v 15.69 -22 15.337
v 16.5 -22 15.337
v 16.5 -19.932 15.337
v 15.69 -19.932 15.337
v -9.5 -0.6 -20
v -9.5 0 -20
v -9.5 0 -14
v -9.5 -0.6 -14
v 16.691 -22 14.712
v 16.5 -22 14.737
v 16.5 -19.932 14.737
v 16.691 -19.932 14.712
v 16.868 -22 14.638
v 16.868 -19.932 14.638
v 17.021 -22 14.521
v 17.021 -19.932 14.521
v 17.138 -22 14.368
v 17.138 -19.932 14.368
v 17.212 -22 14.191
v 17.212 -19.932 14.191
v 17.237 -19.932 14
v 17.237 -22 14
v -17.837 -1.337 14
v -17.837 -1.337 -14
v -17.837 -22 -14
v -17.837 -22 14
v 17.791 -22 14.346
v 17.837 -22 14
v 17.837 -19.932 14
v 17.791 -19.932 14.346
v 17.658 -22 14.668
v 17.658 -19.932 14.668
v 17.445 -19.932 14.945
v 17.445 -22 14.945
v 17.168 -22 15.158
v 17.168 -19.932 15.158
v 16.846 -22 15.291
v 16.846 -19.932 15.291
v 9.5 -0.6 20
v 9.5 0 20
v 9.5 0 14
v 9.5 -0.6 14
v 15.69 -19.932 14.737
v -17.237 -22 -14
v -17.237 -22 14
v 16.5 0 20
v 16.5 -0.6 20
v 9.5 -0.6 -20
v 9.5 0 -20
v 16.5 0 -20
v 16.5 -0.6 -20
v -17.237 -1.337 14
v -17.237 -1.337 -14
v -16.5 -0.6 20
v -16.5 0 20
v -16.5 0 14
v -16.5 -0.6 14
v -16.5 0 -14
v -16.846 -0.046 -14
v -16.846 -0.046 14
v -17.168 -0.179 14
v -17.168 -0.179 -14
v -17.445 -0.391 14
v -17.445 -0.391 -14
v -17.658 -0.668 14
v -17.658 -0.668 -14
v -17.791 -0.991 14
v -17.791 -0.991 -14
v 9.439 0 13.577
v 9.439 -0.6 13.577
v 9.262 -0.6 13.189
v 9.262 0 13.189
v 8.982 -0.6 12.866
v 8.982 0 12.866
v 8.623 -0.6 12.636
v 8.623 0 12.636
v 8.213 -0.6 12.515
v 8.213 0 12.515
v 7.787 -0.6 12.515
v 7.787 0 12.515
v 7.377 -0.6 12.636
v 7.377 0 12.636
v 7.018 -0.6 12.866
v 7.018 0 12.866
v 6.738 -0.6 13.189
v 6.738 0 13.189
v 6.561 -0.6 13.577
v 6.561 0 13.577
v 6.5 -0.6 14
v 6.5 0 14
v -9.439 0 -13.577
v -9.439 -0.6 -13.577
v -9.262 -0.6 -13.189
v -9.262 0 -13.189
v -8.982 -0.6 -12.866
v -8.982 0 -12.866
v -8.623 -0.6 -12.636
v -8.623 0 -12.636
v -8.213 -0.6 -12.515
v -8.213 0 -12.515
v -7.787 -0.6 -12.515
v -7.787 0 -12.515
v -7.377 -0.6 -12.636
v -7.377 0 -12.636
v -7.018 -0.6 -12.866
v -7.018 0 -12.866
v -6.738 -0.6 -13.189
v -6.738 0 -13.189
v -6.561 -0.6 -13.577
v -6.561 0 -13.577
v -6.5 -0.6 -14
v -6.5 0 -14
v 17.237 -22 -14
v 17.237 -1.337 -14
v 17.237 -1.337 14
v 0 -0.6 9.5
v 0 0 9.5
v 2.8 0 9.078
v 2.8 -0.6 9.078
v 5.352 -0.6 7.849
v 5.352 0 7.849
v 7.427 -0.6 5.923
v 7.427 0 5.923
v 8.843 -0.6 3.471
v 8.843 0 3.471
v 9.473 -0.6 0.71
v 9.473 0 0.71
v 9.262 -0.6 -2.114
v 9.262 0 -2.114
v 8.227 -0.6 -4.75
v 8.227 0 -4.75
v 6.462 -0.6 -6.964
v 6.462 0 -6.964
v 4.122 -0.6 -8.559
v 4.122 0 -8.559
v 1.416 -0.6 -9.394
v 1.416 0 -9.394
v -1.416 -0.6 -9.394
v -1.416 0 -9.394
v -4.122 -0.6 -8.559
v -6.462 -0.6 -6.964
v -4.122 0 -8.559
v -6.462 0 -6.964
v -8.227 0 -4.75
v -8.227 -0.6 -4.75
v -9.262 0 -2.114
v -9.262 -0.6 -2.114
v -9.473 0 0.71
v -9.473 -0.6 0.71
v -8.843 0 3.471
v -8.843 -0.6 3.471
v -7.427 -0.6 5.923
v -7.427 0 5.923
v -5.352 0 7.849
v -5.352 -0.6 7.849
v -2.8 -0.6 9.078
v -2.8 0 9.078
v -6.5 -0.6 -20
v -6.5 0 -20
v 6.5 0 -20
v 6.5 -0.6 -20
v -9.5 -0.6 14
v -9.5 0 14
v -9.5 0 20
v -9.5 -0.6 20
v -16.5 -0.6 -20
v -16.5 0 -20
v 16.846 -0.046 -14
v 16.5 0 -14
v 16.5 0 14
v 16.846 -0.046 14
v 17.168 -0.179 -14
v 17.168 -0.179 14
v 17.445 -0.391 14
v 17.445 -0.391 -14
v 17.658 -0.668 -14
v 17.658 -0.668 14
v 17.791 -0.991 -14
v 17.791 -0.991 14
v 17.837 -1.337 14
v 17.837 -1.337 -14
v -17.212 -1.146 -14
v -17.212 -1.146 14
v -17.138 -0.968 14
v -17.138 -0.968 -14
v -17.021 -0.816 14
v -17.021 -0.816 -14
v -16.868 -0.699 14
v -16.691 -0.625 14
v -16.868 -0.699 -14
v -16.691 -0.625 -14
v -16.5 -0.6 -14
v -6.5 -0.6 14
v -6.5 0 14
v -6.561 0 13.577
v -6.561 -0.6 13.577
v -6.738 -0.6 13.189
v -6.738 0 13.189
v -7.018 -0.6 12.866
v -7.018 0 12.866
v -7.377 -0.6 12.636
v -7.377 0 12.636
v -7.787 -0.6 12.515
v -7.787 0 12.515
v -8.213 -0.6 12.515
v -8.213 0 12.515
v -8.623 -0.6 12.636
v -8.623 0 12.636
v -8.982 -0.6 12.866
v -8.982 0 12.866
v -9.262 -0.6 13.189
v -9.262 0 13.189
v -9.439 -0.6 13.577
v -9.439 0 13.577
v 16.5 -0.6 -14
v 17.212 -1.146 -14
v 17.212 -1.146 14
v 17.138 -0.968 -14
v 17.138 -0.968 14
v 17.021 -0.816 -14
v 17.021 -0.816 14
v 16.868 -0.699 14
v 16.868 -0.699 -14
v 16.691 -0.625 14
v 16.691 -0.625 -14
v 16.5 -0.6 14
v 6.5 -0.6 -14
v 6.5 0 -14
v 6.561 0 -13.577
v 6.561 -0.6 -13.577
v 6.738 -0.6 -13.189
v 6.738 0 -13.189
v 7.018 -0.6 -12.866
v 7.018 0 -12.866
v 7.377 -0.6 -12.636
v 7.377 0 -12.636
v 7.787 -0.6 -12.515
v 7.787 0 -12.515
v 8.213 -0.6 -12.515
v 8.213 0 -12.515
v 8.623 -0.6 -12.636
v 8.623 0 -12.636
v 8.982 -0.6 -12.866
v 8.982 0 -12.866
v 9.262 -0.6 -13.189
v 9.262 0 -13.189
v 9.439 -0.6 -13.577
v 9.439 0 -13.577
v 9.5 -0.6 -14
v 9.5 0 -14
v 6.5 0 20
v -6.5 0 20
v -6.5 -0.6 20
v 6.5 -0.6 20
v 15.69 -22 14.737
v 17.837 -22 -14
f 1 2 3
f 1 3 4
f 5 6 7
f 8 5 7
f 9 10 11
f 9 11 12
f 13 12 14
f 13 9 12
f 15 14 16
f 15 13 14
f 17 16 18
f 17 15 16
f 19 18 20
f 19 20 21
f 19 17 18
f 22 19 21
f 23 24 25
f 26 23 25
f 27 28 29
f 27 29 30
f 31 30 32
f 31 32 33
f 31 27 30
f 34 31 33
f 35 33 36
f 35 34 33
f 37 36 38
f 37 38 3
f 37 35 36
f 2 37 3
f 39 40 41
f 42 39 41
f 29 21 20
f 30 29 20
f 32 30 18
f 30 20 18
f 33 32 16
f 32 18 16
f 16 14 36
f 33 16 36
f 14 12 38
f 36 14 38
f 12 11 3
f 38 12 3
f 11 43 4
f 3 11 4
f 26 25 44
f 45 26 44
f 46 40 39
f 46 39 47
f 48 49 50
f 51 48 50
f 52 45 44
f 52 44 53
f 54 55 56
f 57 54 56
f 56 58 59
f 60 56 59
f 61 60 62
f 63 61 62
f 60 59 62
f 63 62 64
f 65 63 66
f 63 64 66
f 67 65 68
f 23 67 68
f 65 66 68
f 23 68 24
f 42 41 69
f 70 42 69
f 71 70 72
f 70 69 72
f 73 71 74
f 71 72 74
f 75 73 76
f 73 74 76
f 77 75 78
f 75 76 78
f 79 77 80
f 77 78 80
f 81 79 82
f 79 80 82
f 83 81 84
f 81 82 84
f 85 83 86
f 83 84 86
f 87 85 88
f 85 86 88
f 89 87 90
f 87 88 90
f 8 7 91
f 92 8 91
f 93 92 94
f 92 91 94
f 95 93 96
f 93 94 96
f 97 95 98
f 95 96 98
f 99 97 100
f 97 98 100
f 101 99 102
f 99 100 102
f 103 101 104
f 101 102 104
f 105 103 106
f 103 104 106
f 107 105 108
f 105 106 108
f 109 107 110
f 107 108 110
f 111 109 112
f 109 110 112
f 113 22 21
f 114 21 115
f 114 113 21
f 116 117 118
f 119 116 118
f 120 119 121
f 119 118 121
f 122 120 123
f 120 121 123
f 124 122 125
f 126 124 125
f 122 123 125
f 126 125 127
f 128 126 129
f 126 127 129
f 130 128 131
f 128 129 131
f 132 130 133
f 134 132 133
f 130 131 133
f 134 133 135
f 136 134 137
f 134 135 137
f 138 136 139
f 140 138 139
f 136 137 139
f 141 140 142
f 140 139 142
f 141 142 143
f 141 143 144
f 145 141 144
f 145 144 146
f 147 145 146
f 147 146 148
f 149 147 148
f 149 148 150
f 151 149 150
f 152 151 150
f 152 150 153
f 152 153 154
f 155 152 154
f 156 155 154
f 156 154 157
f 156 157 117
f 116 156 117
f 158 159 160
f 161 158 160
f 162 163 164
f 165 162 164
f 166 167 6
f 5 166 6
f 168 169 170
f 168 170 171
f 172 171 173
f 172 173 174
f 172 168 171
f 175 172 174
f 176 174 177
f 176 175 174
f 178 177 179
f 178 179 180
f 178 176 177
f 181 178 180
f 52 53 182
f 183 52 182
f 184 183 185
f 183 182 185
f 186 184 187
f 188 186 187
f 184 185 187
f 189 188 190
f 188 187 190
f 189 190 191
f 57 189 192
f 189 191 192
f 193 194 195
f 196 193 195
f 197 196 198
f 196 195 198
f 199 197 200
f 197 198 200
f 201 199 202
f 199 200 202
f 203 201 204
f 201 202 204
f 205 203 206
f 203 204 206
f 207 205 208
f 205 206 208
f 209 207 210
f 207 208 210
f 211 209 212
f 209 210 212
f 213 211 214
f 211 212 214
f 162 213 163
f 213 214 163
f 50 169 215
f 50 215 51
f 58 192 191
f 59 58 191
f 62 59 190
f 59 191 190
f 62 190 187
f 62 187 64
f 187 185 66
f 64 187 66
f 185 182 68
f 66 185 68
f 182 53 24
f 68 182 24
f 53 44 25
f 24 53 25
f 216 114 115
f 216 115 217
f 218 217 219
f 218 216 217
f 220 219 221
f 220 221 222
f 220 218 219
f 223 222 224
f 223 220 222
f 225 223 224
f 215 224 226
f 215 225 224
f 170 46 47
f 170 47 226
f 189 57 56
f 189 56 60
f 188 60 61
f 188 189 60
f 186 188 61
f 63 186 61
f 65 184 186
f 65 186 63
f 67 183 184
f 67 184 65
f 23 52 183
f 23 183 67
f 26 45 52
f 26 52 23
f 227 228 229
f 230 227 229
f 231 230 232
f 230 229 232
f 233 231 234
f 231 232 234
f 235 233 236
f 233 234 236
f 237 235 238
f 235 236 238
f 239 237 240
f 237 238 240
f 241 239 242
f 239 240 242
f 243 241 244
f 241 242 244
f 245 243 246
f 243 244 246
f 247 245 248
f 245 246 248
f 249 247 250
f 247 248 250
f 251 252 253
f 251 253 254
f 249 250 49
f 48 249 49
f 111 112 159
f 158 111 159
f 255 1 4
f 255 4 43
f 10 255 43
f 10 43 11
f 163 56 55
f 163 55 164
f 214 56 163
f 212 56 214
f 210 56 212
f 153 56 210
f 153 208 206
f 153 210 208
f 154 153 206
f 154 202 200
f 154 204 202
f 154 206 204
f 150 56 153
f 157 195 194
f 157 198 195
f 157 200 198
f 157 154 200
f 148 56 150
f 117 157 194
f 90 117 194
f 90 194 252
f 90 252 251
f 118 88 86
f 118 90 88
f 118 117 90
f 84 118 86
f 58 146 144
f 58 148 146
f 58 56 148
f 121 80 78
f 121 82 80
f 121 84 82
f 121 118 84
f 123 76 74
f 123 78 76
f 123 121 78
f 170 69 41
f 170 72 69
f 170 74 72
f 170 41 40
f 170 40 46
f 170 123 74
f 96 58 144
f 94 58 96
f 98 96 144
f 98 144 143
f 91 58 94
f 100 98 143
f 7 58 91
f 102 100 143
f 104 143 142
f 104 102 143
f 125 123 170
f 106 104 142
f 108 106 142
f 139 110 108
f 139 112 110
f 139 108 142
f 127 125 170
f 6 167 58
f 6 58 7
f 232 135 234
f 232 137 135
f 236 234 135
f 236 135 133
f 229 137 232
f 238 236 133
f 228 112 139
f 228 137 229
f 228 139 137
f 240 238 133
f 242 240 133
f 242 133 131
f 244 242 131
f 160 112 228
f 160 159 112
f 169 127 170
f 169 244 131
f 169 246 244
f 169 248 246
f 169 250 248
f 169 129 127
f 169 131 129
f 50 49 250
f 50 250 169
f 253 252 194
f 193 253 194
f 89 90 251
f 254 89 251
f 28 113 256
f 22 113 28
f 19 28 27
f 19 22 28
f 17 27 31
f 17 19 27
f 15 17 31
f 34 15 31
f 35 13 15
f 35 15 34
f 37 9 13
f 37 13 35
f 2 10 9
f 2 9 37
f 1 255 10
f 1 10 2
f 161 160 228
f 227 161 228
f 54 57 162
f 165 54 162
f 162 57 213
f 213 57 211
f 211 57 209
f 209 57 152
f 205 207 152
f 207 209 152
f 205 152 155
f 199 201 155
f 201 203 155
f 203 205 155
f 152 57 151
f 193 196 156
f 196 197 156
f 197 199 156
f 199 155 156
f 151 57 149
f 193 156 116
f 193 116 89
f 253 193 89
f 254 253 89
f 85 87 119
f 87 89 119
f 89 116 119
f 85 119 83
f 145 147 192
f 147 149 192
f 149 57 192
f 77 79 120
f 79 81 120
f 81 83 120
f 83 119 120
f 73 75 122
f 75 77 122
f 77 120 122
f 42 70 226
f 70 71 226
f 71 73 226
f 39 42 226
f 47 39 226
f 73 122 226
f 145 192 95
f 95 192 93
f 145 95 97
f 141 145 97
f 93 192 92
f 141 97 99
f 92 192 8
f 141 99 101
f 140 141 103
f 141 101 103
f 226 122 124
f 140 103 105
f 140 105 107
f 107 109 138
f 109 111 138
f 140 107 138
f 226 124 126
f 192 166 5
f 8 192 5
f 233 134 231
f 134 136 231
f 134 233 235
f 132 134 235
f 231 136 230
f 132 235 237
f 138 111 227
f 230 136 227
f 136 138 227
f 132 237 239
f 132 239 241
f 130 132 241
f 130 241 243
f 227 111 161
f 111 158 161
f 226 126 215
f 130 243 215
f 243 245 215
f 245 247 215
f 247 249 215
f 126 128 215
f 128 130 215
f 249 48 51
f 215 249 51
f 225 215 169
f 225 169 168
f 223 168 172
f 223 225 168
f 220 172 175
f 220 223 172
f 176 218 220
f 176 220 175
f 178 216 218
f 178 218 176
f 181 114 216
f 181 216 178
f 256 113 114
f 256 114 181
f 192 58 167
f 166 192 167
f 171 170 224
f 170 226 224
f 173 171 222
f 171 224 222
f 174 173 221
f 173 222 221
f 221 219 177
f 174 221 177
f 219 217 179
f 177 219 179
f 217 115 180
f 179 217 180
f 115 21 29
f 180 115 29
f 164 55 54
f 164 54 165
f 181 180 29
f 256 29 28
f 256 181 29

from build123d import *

# Parameters (mm, degrees)
SKETCH1_W           = 33
SKETCH1_H           = 40
BASE_FLANGE1_DEPTH  = 0.6
CUT_EXTRUDE1_DEPTH  = 10
EDGE_FLANGE1_DEPTH  = 28
SKETCH21_R          = 9.5
CUT_EXTRUDE11_DEPTH = 10
EDGE_FLANGE2_DEPTH  = 2.068329304


# Sheet-metal steps are written as plain solids
with BuildPart() as part:
    # Sketch1 → Base-Flange1 (new body)
    with BuildSketch(Plane(origin=(0, 0, 0), x_dir=(1, 0, 0), z_dir=(0, 1, 0))):
        Rectangle(SKETCH1_W, SKETCH1_H)
    extrude(amount=-BASE_FLANGE1_DEPTH)

    # Sketch6 → Cut-Extrude1 (cut)
    with BuildSketch(Plane(origin=(0, 0, 0), x_dir=(1, 0, 0), z_dir=(0, 1, 0))):
        with BuildLine():
            Line((-9.5, 20), (-9.5, 14))
            ThreePointArc((-9.5, 14), (-8, 12.5), (-6.5, 14))
            Line((-6.5, 14), (-6.5, 20))
            Line((-6.5, 20), (-9.5, 20))
        make_face()
        with BuildLine():
            Line((6.5, 20), (6.5, 14))
            ThreePointArc((6.5, 14), (8, 12.5), (9.5, 14))
            Line((9.5, 14), (9.5, 20))
            Line((9.5, 20), (6.5, 20))
        make_face()
        with BuildLine():
            Line((9.5, -20), (9.5, -14))
            ThreePointArc((9.5, -14), (8, -12.5), (6.5, -14))
            Line((6.5, -14), (6.5, -20))
            Line((6.5, -20), (9.5, -20))
        make_face()
        with BuildLine():
            Line((-9.5, -20), (-6.5, -20))
            Line((-6.5, -20), (-6.5, -14))
            ThreePointArc((-6.5, -14), (-8, -12.5), (-9.5, -14))
            Line((-9.5, -14), (-9.5, -20))
        make_face()
    extrude(amount=-CUT_EXTRUDE1_DEPTH, mode=Mode.SUBTRACT)

    # Edge-Flange1 section (across the edge) → Edge-Flange1 (add)
    with BuildSketch(Plane(origin=(17.2366, -0.6, -14), x_dir=(-1, 0, 0), z_dir=(0, 0, 1))):
        with BuildLine():
            Line((-0.6, 0.7366), (-0.6, 21.4))
            Line((-0.6, 21.4), (0, 21.4))
            Line((0, 21.4), (0, 0.7366))
            ThreePointArc((0, 0.7366), (0.215745145, 0.215745145), (0.7366, 0))
            Line((0.7366, 0), (0.7366, -0.6))
            ThreePointArc((0.7366, -0.6), (-0.208518924, -0.208518924), (-0.6, 0.7366))
        make_face()
    edge_flange1 = extrude(amount=EDGE_FLANGE1_DEPTH)

    # Mirror1: Edge-Flange1 across plane
    add(edge_flange1.mirror(Plane(origin=(0, 0, 0), x_dir=(0, 0, 1), z_dir=(1, 0, 0))))

    # Sketch21 → Cut-Extrude11 (cut)
    with BuildSketch(Plane(origin=(0, 0, 0), x_dir=(1, 0, 0), z_dir=(0, 1, 0))):
        with Locations(Location((0, 0, 0), (0, 0, 270))):
            Circle(SKETCH21_R)
    extrude(amount=-CUT_EXTRUDE11_DEPTH, mode=Mode.SUBTRACT)

    # Edge-Flange2 section (across the edge) → Edge-Flange2 (add)
    with BuildSketch(Plane(origin=(17.2366, -22, 14.7366), x_dir=(0, 0, -1), z_dir=(0, 1, 0))):
        with BuildLine():
            Line((-0.6, 0.7366), (-0.6, 1.546122954))
            Line((-0.6, 1.546122954), (0, 1.546122954))
            Line((0, 1.546122954), (0, 0.7366))
            ThreePointArc((0, 0.7366), (0.215745145, 0.215745145), (0.7366, 0))
            Line((0.7366, 0), (0.7366, -0.6))
            ThreePointArc((0.7366, -0.6), (-0.208518924, -0.208518924), (-0.6, 0.7366))
        make_face()
    extrude(amount=EDGE_FLANGE2_DEPTH)


solid = part.part
